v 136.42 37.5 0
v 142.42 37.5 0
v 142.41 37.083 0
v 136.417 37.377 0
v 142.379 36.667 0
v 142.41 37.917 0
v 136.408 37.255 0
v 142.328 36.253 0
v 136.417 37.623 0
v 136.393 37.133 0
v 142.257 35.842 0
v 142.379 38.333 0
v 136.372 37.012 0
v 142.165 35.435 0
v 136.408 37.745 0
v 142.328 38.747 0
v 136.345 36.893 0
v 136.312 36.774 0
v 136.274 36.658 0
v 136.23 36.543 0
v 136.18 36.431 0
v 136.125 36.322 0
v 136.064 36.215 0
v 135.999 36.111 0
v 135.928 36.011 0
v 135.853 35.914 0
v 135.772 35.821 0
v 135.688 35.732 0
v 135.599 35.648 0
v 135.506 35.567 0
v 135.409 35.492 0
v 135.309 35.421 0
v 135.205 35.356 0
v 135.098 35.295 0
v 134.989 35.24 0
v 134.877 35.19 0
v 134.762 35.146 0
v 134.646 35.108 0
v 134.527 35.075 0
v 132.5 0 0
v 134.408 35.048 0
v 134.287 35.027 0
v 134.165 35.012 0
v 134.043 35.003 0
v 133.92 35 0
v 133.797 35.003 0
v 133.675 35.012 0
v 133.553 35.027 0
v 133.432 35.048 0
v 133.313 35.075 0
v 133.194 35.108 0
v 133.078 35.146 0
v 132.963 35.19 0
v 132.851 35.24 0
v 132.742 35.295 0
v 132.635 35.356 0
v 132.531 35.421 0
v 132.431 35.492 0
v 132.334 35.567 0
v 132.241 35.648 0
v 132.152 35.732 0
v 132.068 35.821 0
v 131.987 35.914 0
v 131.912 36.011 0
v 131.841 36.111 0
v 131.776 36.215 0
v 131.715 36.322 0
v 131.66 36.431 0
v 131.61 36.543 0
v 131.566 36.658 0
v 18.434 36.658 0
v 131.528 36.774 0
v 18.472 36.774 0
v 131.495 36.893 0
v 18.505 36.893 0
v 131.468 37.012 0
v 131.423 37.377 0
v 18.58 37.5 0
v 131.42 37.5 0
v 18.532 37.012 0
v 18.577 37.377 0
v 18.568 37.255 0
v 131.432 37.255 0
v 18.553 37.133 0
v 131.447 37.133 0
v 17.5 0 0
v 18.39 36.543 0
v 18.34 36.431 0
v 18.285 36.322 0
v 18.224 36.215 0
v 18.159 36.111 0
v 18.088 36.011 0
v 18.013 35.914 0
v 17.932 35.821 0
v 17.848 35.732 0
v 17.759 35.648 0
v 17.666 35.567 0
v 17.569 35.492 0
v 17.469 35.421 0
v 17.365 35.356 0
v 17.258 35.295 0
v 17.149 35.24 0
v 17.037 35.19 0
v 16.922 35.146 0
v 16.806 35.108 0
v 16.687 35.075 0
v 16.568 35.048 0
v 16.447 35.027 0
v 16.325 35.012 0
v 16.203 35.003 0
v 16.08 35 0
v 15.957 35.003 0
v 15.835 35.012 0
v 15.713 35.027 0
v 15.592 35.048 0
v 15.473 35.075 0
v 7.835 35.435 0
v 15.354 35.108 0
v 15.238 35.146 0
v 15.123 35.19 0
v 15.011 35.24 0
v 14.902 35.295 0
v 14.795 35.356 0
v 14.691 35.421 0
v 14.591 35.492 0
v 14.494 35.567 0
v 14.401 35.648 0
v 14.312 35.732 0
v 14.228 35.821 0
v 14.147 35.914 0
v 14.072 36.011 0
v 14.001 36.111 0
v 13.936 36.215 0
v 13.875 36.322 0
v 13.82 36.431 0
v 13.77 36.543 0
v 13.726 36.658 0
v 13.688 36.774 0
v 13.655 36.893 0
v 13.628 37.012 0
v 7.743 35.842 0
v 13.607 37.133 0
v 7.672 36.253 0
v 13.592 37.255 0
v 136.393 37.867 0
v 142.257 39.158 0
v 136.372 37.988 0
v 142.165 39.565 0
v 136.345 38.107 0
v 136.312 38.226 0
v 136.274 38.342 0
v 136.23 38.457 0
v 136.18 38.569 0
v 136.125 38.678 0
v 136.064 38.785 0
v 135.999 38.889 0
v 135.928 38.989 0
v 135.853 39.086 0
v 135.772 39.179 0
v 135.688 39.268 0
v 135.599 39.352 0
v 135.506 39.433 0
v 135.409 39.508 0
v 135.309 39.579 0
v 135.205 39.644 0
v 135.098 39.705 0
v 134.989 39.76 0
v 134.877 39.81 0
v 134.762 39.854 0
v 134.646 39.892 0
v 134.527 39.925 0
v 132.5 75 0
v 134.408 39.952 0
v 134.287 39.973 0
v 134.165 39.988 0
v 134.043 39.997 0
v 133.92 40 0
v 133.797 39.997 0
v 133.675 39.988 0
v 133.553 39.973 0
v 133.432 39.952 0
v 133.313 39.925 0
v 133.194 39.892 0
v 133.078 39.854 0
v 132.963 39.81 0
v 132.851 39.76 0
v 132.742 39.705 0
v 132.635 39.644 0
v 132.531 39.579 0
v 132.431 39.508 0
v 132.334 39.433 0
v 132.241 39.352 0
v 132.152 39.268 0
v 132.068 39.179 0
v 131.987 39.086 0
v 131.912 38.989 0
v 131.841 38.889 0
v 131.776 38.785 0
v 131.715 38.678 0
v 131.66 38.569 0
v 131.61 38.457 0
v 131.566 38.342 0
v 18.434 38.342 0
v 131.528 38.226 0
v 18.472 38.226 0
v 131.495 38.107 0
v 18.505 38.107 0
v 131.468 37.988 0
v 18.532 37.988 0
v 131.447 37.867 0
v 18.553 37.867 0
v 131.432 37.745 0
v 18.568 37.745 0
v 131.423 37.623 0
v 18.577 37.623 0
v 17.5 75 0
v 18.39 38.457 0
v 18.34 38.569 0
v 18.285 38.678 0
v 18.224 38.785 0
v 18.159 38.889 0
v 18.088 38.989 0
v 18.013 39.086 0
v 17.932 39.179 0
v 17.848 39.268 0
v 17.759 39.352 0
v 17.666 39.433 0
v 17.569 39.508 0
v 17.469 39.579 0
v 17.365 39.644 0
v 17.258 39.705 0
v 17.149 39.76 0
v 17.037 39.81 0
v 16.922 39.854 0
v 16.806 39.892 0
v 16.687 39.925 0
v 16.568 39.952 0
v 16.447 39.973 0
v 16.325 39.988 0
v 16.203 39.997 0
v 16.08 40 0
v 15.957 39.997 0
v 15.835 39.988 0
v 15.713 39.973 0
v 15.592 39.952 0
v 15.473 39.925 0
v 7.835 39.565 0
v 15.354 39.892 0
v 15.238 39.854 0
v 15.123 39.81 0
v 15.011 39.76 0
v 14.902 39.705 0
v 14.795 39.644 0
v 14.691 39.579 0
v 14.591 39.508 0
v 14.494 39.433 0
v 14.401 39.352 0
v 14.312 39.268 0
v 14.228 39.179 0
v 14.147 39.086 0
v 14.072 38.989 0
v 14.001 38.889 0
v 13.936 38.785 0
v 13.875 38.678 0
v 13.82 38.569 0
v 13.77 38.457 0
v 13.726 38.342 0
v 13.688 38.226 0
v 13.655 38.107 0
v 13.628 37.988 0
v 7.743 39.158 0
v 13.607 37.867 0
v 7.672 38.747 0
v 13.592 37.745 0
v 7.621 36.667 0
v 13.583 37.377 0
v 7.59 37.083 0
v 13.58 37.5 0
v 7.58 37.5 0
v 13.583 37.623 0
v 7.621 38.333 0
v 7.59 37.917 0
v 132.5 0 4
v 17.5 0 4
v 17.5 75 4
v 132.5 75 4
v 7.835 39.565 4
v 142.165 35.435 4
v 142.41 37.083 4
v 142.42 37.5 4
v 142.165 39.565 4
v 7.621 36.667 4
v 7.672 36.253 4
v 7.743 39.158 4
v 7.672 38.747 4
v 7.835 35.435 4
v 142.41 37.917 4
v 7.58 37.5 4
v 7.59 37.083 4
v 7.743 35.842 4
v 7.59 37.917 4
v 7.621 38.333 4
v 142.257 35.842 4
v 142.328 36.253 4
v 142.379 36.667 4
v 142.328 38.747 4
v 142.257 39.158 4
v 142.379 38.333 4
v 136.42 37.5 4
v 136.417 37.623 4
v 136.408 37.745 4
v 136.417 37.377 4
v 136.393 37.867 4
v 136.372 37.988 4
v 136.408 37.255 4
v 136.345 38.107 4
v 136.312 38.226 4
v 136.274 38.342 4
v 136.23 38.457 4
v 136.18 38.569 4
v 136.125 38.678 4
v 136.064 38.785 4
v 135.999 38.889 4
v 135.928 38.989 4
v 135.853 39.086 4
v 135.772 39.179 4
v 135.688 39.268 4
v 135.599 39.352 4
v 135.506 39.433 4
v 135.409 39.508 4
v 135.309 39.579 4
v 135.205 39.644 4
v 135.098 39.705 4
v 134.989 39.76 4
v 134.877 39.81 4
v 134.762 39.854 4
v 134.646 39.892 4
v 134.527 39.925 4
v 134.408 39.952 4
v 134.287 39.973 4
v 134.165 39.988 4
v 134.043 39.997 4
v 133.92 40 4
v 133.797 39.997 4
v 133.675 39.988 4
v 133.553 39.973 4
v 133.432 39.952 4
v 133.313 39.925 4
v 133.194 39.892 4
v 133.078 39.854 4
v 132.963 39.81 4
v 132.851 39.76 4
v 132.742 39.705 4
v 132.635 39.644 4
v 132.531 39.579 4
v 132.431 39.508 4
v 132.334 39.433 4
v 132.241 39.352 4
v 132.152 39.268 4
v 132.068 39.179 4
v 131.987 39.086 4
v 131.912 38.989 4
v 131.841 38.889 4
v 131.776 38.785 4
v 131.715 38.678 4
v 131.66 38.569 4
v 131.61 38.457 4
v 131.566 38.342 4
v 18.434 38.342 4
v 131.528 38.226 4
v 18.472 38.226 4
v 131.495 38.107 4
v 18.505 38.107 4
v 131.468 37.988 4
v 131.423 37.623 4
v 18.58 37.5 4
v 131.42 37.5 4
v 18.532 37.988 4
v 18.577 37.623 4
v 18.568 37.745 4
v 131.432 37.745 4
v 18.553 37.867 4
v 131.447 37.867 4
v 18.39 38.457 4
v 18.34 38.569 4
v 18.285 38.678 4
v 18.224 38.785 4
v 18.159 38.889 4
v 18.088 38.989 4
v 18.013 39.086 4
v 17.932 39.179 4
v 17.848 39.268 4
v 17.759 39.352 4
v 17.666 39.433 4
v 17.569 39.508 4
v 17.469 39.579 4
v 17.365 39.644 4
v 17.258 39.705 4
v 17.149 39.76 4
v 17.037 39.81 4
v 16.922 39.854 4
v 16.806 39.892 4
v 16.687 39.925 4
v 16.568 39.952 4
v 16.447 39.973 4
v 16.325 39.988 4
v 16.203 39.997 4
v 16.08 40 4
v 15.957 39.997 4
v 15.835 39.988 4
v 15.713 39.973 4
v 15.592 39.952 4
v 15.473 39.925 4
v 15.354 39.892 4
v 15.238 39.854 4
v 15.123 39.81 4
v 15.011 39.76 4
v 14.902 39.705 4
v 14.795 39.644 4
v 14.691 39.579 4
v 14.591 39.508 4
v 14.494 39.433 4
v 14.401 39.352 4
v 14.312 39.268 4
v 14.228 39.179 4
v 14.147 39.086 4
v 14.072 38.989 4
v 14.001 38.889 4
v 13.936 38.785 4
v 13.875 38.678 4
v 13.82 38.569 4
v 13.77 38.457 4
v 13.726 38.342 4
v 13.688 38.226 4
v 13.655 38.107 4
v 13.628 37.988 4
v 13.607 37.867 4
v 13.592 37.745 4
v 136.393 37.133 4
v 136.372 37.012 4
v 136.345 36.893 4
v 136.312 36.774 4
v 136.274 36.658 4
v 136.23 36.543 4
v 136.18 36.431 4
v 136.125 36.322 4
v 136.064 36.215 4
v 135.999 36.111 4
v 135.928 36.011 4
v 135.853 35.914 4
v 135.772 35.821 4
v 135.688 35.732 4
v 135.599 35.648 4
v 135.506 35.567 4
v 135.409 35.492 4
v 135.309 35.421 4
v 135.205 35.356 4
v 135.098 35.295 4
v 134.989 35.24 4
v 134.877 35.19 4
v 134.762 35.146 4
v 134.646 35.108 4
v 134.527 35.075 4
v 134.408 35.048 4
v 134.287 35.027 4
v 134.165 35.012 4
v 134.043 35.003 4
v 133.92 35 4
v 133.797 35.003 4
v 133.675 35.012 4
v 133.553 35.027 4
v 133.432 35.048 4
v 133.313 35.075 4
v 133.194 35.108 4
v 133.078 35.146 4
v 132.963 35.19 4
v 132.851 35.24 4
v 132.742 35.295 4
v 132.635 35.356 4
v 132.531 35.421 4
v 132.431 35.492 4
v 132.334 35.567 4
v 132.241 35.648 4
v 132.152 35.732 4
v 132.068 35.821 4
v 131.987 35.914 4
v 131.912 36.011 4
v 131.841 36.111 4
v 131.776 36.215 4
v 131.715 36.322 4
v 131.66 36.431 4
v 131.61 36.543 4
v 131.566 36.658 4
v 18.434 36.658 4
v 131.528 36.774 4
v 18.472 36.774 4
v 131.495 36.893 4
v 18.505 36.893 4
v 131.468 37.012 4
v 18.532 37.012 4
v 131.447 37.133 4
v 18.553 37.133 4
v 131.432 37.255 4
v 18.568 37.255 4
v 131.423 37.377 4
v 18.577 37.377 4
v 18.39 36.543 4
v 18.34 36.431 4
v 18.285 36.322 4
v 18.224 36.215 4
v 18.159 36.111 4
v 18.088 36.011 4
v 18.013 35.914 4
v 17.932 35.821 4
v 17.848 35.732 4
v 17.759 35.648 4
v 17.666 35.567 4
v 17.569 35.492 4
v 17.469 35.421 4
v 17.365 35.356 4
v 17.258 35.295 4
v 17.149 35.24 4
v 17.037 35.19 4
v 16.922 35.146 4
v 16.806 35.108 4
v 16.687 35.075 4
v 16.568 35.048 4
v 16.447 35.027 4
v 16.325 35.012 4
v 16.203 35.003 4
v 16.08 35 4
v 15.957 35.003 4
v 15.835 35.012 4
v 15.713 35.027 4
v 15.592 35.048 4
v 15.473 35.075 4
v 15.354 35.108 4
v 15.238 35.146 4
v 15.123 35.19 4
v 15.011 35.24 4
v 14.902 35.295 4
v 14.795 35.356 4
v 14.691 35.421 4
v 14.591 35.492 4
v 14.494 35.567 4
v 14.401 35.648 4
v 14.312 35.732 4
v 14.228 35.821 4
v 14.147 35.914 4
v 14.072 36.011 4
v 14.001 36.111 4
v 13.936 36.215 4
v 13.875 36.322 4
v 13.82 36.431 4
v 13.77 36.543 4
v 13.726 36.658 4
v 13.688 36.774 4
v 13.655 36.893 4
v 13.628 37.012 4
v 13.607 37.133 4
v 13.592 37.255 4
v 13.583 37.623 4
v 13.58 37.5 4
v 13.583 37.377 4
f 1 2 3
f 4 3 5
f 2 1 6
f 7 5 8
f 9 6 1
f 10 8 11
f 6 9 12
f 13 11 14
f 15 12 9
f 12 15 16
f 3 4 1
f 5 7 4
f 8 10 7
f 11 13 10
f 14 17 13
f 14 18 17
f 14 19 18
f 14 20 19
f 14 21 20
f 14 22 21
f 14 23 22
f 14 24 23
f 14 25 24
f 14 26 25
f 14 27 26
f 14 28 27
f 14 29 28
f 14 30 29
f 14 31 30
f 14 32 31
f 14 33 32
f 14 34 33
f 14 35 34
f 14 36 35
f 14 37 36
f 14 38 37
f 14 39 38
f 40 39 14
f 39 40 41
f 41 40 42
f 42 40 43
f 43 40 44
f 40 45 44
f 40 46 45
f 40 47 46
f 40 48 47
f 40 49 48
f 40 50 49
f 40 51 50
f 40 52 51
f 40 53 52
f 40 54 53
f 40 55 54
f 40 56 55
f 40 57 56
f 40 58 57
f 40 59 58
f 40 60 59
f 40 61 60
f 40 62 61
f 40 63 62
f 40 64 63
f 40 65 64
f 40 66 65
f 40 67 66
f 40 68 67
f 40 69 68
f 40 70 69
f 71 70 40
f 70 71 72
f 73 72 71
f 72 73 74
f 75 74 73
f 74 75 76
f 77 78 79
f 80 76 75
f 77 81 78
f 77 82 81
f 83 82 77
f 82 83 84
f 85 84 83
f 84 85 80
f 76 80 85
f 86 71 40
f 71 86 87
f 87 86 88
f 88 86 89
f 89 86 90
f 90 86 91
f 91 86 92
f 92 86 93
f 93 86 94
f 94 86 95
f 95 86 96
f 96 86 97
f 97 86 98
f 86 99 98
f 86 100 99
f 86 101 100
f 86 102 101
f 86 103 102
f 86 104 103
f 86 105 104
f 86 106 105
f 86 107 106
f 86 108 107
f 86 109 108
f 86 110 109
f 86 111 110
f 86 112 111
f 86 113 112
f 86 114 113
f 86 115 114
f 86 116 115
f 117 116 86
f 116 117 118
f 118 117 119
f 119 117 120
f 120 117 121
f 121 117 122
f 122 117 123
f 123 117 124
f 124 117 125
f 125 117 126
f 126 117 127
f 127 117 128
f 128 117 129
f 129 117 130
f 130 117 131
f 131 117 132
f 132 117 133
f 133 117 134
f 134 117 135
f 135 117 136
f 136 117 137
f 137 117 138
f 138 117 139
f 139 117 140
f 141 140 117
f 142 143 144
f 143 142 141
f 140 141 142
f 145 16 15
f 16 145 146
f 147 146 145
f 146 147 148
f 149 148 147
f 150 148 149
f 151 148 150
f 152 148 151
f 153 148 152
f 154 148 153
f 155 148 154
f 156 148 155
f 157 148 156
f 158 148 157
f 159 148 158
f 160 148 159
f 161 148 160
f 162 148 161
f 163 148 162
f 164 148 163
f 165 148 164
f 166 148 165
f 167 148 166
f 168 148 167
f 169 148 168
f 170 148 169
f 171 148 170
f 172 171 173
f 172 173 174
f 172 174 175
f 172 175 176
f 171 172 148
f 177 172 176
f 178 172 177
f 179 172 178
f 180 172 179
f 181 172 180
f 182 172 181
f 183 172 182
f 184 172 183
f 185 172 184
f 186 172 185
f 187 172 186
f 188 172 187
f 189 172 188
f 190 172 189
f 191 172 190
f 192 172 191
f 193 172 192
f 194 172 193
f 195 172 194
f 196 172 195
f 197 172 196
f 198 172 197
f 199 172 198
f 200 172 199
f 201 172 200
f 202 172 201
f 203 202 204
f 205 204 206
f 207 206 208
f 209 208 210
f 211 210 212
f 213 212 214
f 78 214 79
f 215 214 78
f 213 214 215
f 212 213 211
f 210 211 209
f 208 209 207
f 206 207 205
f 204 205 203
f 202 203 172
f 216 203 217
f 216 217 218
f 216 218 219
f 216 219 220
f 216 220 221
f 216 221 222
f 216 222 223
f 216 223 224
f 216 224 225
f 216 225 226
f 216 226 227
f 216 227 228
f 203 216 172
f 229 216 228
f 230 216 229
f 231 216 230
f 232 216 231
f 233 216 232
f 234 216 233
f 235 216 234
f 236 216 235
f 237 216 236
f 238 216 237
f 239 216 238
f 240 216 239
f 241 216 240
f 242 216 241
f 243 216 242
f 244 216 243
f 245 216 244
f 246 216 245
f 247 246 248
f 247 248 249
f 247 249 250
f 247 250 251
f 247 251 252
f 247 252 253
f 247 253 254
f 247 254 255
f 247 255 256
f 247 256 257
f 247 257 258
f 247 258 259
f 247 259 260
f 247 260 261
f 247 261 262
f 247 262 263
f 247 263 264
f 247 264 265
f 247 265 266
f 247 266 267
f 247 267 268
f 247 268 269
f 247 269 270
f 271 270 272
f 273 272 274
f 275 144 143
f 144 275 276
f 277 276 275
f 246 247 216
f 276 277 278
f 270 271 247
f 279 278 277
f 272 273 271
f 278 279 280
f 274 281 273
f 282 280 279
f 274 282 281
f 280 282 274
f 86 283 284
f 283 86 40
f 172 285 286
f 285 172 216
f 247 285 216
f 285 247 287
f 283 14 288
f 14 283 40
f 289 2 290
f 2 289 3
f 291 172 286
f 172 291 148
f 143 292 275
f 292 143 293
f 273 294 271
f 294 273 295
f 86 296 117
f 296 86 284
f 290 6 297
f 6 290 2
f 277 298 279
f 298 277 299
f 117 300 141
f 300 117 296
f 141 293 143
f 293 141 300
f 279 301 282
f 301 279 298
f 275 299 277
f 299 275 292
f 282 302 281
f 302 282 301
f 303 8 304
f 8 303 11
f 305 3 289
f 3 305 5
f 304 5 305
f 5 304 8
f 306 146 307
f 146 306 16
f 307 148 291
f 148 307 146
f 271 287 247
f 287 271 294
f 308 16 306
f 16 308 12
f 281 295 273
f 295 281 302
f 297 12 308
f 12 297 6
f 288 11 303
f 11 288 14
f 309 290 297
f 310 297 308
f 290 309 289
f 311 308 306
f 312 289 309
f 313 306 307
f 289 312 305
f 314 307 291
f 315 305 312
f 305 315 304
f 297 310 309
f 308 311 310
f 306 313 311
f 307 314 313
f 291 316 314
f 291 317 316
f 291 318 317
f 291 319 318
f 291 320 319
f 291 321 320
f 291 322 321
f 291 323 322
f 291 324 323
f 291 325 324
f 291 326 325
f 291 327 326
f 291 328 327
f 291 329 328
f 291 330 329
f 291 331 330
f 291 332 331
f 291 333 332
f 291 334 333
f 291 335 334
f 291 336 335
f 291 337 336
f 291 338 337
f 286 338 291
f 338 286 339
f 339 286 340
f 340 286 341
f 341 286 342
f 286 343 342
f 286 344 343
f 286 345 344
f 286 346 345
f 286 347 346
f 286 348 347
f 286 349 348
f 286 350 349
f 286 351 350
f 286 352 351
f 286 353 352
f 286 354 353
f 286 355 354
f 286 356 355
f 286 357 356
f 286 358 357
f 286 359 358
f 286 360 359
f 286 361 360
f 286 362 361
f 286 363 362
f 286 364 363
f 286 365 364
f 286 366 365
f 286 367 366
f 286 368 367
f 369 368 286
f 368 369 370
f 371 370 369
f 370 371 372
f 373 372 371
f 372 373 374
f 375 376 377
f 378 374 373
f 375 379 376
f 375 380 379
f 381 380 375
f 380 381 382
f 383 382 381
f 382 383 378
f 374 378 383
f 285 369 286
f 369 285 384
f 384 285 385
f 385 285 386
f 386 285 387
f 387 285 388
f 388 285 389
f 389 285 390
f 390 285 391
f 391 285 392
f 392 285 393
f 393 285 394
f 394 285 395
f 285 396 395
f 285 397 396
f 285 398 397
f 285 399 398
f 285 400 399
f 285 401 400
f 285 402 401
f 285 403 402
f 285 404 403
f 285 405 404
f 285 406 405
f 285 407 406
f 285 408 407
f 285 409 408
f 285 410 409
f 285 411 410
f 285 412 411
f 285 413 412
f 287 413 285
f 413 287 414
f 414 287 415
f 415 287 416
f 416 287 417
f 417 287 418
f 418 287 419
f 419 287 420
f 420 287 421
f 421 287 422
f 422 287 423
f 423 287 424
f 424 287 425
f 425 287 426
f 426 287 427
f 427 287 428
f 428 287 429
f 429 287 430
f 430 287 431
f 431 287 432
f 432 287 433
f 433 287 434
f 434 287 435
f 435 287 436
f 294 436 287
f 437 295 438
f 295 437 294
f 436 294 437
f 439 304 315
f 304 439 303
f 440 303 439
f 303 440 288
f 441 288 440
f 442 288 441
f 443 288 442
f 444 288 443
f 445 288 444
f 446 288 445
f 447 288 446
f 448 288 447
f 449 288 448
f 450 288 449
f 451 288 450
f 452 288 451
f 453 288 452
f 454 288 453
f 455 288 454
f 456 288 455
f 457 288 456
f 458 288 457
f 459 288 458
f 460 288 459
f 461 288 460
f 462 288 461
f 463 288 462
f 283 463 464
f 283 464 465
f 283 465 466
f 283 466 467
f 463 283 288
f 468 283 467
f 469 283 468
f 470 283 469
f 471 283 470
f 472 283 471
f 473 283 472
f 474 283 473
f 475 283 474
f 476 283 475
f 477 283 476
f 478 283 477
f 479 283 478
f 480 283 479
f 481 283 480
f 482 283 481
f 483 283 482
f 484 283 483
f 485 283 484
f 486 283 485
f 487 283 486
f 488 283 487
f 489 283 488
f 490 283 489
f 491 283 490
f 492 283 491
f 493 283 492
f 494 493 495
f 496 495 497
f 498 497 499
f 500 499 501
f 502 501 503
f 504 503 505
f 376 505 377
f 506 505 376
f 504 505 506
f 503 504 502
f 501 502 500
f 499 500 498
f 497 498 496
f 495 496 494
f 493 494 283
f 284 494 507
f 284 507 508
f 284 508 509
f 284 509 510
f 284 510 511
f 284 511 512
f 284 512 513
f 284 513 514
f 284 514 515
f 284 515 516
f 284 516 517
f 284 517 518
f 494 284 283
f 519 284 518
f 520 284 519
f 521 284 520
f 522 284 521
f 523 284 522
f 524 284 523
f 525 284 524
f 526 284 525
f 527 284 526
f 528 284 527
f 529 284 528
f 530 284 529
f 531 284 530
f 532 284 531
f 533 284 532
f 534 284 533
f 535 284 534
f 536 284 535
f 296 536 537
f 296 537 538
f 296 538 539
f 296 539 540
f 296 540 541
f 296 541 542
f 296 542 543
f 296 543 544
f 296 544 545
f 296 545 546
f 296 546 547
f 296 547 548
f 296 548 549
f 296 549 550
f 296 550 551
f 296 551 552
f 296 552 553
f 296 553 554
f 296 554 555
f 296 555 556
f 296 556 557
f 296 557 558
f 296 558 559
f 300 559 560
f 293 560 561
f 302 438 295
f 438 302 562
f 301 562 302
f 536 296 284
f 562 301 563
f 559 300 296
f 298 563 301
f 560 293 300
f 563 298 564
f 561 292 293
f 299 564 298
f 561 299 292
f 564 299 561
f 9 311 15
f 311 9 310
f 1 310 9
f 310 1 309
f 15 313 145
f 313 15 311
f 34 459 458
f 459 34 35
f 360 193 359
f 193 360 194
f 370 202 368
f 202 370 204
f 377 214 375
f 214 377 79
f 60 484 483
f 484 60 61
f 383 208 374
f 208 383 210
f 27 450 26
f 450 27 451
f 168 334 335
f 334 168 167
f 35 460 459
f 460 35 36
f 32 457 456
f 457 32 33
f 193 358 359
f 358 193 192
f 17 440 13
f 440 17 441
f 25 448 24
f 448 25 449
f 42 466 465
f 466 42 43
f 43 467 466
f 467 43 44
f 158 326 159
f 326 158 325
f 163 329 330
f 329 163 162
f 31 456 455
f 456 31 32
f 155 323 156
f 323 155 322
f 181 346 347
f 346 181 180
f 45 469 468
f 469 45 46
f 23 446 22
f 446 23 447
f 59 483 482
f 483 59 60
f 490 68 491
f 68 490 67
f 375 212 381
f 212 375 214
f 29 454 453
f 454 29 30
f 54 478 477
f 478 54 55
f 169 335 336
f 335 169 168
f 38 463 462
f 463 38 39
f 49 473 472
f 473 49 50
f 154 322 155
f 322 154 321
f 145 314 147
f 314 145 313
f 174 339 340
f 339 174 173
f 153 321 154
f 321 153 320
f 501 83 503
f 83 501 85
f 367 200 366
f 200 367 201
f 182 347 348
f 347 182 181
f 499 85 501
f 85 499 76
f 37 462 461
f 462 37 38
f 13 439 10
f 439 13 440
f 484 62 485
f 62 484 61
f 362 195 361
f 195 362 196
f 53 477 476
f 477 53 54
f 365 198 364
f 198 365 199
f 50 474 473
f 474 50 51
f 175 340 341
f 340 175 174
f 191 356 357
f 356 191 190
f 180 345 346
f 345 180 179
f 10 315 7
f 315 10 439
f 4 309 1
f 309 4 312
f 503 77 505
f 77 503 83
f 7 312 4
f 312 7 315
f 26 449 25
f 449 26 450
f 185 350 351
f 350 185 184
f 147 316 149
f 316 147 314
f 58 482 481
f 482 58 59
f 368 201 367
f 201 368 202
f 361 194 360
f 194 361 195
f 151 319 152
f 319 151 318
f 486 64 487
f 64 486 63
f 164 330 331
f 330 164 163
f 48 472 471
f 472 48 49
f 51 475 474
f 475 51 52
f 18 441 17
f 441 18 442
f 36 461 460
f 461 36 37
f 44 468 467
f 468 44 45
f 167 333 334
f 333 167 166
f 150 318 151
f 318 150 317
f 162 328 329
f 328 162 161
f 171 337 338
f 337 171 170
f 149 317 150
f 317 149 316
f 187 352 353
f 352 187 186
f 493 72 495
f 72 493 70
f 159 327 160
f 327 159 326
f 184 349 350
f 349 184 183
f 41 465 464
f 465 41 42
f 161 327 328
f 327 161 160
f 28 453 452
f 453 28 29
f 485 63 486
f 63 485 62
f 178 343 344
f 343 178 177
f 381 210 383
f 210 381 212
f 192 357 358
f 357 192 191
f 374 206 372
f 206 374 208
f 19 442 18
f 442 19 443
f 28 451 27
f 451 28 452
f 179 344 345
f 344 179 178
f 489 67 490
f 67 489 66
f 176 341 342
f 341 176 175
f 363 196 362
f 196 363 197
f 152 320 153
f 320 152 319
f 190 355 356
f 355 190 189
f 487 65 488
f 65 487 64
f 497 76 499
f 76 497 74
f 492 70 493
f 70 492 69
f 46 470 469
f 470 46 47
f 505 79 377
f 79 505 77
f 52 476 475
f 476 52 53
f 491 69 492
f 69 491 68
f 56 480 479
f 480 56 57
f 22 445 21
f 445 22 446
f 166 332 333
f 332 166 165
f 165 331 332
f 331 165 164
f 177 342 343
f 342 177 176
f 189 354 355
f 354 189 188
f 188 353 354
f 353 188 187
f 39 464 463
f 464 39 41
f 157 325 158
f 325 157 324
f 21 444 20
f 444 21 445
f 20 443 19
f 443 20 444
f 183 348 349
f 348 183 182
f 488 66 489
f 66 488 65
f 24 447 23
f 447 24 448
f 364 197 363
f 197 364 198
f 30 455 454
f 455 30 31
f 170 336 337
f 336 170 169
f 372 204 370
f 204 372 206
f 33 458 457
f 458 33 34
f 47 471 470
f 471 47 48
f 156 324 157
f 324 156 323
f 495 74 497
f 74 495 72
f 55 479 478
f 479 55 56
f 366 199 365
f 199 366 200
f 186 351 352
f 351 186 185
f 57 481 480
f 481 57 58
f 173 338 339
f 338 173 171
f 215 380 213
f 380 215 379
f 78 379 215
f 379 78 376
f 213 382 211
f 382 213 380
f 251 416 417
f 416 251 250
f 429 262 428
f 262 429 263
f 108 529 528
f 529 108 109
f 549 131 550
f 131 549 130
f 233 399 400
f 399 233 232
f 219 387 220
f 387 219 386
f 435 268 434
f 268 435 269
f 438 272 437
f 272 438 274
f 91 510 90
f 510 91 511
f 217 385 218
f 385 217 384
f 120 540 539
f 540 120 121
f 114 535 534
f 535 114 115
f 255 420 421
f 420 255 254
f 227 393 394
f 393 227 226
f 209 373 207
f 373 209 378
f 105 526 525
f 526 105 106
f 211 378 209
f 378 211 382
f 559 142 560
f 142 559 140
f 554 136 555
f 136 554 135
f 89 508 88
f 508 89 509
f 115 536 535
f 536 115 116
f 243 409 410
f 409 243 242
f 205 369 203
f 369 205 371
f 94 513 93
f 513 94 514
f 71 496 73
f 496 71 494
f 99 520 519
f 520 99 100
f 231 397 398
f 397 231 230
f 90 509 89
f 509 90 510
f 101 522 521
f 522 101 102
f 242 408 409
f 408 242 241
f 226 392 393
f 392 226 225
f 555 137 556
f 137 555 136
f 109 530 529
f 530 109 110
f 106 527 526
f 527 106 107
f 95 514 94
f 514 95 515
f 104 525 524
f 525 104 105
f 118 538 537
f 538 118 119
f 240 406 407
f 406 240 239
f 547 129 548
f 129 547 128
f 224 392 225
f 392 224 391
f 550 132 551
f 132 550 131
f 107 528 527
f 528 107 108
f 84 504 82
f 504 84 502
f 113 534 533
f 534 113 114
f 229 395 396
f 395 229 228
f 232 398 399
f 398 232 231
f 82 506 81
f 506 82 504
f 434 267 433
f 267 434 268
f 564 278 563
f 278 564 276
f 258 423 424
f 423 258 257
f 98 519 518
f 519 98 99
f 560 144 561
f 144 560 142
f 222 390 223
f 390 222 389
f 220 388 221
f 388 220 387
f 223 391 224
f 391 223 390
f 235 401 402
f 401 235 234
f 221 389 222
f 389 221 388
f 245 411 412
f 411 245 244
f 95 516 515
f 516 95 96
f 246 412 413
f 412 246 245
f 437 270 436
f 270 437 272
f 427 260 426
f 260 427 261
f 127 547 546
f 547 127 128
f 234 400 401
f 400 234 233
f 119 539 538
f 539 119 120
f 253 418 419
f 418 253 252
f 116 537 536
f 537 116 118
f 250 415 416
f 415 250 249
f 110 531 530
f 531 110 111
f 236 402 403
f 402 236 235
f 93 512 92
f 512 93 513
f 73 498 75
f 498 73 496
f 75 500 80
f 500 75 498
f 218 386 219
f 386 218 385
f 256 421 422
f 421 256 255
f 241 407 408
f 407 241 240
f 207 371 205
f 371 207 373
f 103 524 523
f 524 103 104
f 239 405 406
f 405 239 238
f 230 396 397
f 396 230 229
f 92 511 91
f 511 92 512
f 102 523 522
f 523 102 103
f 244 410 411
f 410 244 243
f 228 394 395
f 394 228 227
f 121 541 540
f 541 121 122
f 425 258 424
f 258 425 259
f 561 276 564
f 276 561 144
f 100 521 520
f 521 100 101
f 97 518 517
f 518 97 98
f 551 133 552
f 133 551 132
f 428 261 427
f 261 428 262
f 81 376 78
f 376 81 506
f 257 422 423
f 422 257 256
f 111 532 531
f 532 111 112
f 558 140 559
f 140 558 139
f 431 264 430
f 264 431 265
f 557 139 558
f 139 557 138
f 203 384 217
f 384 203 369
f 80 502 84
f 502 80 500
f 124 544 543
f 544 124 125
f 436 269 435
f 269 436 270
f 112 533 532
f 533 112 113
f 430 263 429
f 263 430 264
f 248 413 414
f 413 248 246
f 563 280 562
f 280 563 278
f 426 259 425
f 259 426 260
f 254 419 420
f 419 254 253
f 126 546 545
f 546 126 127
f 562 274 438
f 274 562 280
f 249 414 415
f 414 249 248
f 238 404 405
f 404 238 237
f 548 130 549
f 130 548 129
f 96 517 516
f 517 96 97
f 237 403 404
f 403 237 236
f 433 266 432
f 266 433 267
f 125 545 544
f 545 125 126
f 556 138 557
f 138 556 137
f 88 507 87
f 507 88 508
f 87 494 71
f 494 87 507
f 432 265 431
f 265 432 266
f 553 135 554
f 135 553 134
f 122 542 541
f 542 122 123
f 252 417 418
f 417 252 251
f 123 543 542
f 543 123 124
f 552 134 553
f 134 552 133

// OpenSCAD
// Print settings: 6 walls, 0 bottom layers & 3 top layers

$fn=128;
toolPlateHoleCenterDist = 29.46;

//translate([150/2 - 110/2,75/2 - 70/2,4]) cube([110, 70, 2]);

difference() {
	w = 150;
	h = 4;
	hull() {
		translate([w/2 - 115/2,0,0]) cube([115, 75, h]);
		translate([w/2 + toolPlateHoleCenterDist*2, 75/2, 0]) cylinder(r=17/2, h=h);
		translate([w/2 - toolPlateHoleCenterDist*2, 75/2, 0]) cylinder(r=17/2, h=h);
	}
	
	//translate([w/2 + toolPlateHoleCenterDist*2, 75/2, 1]) cylinder(r=8/2, h=h+2);
	//translate([w/2 - toolPlateHoleCenterDist*2, 75/2, 1]) cylinder(r=8/2, h=h+2);
		
	translate([w/2 + toolPlateHoleCenterDist*2, 75/2, -0.5]) cylinder(r=5/2, h=h+2);
	translate([w/2 - toolPlateHoleCenterDist*2, 75/2, -0.5]) cylinder(r=5/2, h=h+2);
}
